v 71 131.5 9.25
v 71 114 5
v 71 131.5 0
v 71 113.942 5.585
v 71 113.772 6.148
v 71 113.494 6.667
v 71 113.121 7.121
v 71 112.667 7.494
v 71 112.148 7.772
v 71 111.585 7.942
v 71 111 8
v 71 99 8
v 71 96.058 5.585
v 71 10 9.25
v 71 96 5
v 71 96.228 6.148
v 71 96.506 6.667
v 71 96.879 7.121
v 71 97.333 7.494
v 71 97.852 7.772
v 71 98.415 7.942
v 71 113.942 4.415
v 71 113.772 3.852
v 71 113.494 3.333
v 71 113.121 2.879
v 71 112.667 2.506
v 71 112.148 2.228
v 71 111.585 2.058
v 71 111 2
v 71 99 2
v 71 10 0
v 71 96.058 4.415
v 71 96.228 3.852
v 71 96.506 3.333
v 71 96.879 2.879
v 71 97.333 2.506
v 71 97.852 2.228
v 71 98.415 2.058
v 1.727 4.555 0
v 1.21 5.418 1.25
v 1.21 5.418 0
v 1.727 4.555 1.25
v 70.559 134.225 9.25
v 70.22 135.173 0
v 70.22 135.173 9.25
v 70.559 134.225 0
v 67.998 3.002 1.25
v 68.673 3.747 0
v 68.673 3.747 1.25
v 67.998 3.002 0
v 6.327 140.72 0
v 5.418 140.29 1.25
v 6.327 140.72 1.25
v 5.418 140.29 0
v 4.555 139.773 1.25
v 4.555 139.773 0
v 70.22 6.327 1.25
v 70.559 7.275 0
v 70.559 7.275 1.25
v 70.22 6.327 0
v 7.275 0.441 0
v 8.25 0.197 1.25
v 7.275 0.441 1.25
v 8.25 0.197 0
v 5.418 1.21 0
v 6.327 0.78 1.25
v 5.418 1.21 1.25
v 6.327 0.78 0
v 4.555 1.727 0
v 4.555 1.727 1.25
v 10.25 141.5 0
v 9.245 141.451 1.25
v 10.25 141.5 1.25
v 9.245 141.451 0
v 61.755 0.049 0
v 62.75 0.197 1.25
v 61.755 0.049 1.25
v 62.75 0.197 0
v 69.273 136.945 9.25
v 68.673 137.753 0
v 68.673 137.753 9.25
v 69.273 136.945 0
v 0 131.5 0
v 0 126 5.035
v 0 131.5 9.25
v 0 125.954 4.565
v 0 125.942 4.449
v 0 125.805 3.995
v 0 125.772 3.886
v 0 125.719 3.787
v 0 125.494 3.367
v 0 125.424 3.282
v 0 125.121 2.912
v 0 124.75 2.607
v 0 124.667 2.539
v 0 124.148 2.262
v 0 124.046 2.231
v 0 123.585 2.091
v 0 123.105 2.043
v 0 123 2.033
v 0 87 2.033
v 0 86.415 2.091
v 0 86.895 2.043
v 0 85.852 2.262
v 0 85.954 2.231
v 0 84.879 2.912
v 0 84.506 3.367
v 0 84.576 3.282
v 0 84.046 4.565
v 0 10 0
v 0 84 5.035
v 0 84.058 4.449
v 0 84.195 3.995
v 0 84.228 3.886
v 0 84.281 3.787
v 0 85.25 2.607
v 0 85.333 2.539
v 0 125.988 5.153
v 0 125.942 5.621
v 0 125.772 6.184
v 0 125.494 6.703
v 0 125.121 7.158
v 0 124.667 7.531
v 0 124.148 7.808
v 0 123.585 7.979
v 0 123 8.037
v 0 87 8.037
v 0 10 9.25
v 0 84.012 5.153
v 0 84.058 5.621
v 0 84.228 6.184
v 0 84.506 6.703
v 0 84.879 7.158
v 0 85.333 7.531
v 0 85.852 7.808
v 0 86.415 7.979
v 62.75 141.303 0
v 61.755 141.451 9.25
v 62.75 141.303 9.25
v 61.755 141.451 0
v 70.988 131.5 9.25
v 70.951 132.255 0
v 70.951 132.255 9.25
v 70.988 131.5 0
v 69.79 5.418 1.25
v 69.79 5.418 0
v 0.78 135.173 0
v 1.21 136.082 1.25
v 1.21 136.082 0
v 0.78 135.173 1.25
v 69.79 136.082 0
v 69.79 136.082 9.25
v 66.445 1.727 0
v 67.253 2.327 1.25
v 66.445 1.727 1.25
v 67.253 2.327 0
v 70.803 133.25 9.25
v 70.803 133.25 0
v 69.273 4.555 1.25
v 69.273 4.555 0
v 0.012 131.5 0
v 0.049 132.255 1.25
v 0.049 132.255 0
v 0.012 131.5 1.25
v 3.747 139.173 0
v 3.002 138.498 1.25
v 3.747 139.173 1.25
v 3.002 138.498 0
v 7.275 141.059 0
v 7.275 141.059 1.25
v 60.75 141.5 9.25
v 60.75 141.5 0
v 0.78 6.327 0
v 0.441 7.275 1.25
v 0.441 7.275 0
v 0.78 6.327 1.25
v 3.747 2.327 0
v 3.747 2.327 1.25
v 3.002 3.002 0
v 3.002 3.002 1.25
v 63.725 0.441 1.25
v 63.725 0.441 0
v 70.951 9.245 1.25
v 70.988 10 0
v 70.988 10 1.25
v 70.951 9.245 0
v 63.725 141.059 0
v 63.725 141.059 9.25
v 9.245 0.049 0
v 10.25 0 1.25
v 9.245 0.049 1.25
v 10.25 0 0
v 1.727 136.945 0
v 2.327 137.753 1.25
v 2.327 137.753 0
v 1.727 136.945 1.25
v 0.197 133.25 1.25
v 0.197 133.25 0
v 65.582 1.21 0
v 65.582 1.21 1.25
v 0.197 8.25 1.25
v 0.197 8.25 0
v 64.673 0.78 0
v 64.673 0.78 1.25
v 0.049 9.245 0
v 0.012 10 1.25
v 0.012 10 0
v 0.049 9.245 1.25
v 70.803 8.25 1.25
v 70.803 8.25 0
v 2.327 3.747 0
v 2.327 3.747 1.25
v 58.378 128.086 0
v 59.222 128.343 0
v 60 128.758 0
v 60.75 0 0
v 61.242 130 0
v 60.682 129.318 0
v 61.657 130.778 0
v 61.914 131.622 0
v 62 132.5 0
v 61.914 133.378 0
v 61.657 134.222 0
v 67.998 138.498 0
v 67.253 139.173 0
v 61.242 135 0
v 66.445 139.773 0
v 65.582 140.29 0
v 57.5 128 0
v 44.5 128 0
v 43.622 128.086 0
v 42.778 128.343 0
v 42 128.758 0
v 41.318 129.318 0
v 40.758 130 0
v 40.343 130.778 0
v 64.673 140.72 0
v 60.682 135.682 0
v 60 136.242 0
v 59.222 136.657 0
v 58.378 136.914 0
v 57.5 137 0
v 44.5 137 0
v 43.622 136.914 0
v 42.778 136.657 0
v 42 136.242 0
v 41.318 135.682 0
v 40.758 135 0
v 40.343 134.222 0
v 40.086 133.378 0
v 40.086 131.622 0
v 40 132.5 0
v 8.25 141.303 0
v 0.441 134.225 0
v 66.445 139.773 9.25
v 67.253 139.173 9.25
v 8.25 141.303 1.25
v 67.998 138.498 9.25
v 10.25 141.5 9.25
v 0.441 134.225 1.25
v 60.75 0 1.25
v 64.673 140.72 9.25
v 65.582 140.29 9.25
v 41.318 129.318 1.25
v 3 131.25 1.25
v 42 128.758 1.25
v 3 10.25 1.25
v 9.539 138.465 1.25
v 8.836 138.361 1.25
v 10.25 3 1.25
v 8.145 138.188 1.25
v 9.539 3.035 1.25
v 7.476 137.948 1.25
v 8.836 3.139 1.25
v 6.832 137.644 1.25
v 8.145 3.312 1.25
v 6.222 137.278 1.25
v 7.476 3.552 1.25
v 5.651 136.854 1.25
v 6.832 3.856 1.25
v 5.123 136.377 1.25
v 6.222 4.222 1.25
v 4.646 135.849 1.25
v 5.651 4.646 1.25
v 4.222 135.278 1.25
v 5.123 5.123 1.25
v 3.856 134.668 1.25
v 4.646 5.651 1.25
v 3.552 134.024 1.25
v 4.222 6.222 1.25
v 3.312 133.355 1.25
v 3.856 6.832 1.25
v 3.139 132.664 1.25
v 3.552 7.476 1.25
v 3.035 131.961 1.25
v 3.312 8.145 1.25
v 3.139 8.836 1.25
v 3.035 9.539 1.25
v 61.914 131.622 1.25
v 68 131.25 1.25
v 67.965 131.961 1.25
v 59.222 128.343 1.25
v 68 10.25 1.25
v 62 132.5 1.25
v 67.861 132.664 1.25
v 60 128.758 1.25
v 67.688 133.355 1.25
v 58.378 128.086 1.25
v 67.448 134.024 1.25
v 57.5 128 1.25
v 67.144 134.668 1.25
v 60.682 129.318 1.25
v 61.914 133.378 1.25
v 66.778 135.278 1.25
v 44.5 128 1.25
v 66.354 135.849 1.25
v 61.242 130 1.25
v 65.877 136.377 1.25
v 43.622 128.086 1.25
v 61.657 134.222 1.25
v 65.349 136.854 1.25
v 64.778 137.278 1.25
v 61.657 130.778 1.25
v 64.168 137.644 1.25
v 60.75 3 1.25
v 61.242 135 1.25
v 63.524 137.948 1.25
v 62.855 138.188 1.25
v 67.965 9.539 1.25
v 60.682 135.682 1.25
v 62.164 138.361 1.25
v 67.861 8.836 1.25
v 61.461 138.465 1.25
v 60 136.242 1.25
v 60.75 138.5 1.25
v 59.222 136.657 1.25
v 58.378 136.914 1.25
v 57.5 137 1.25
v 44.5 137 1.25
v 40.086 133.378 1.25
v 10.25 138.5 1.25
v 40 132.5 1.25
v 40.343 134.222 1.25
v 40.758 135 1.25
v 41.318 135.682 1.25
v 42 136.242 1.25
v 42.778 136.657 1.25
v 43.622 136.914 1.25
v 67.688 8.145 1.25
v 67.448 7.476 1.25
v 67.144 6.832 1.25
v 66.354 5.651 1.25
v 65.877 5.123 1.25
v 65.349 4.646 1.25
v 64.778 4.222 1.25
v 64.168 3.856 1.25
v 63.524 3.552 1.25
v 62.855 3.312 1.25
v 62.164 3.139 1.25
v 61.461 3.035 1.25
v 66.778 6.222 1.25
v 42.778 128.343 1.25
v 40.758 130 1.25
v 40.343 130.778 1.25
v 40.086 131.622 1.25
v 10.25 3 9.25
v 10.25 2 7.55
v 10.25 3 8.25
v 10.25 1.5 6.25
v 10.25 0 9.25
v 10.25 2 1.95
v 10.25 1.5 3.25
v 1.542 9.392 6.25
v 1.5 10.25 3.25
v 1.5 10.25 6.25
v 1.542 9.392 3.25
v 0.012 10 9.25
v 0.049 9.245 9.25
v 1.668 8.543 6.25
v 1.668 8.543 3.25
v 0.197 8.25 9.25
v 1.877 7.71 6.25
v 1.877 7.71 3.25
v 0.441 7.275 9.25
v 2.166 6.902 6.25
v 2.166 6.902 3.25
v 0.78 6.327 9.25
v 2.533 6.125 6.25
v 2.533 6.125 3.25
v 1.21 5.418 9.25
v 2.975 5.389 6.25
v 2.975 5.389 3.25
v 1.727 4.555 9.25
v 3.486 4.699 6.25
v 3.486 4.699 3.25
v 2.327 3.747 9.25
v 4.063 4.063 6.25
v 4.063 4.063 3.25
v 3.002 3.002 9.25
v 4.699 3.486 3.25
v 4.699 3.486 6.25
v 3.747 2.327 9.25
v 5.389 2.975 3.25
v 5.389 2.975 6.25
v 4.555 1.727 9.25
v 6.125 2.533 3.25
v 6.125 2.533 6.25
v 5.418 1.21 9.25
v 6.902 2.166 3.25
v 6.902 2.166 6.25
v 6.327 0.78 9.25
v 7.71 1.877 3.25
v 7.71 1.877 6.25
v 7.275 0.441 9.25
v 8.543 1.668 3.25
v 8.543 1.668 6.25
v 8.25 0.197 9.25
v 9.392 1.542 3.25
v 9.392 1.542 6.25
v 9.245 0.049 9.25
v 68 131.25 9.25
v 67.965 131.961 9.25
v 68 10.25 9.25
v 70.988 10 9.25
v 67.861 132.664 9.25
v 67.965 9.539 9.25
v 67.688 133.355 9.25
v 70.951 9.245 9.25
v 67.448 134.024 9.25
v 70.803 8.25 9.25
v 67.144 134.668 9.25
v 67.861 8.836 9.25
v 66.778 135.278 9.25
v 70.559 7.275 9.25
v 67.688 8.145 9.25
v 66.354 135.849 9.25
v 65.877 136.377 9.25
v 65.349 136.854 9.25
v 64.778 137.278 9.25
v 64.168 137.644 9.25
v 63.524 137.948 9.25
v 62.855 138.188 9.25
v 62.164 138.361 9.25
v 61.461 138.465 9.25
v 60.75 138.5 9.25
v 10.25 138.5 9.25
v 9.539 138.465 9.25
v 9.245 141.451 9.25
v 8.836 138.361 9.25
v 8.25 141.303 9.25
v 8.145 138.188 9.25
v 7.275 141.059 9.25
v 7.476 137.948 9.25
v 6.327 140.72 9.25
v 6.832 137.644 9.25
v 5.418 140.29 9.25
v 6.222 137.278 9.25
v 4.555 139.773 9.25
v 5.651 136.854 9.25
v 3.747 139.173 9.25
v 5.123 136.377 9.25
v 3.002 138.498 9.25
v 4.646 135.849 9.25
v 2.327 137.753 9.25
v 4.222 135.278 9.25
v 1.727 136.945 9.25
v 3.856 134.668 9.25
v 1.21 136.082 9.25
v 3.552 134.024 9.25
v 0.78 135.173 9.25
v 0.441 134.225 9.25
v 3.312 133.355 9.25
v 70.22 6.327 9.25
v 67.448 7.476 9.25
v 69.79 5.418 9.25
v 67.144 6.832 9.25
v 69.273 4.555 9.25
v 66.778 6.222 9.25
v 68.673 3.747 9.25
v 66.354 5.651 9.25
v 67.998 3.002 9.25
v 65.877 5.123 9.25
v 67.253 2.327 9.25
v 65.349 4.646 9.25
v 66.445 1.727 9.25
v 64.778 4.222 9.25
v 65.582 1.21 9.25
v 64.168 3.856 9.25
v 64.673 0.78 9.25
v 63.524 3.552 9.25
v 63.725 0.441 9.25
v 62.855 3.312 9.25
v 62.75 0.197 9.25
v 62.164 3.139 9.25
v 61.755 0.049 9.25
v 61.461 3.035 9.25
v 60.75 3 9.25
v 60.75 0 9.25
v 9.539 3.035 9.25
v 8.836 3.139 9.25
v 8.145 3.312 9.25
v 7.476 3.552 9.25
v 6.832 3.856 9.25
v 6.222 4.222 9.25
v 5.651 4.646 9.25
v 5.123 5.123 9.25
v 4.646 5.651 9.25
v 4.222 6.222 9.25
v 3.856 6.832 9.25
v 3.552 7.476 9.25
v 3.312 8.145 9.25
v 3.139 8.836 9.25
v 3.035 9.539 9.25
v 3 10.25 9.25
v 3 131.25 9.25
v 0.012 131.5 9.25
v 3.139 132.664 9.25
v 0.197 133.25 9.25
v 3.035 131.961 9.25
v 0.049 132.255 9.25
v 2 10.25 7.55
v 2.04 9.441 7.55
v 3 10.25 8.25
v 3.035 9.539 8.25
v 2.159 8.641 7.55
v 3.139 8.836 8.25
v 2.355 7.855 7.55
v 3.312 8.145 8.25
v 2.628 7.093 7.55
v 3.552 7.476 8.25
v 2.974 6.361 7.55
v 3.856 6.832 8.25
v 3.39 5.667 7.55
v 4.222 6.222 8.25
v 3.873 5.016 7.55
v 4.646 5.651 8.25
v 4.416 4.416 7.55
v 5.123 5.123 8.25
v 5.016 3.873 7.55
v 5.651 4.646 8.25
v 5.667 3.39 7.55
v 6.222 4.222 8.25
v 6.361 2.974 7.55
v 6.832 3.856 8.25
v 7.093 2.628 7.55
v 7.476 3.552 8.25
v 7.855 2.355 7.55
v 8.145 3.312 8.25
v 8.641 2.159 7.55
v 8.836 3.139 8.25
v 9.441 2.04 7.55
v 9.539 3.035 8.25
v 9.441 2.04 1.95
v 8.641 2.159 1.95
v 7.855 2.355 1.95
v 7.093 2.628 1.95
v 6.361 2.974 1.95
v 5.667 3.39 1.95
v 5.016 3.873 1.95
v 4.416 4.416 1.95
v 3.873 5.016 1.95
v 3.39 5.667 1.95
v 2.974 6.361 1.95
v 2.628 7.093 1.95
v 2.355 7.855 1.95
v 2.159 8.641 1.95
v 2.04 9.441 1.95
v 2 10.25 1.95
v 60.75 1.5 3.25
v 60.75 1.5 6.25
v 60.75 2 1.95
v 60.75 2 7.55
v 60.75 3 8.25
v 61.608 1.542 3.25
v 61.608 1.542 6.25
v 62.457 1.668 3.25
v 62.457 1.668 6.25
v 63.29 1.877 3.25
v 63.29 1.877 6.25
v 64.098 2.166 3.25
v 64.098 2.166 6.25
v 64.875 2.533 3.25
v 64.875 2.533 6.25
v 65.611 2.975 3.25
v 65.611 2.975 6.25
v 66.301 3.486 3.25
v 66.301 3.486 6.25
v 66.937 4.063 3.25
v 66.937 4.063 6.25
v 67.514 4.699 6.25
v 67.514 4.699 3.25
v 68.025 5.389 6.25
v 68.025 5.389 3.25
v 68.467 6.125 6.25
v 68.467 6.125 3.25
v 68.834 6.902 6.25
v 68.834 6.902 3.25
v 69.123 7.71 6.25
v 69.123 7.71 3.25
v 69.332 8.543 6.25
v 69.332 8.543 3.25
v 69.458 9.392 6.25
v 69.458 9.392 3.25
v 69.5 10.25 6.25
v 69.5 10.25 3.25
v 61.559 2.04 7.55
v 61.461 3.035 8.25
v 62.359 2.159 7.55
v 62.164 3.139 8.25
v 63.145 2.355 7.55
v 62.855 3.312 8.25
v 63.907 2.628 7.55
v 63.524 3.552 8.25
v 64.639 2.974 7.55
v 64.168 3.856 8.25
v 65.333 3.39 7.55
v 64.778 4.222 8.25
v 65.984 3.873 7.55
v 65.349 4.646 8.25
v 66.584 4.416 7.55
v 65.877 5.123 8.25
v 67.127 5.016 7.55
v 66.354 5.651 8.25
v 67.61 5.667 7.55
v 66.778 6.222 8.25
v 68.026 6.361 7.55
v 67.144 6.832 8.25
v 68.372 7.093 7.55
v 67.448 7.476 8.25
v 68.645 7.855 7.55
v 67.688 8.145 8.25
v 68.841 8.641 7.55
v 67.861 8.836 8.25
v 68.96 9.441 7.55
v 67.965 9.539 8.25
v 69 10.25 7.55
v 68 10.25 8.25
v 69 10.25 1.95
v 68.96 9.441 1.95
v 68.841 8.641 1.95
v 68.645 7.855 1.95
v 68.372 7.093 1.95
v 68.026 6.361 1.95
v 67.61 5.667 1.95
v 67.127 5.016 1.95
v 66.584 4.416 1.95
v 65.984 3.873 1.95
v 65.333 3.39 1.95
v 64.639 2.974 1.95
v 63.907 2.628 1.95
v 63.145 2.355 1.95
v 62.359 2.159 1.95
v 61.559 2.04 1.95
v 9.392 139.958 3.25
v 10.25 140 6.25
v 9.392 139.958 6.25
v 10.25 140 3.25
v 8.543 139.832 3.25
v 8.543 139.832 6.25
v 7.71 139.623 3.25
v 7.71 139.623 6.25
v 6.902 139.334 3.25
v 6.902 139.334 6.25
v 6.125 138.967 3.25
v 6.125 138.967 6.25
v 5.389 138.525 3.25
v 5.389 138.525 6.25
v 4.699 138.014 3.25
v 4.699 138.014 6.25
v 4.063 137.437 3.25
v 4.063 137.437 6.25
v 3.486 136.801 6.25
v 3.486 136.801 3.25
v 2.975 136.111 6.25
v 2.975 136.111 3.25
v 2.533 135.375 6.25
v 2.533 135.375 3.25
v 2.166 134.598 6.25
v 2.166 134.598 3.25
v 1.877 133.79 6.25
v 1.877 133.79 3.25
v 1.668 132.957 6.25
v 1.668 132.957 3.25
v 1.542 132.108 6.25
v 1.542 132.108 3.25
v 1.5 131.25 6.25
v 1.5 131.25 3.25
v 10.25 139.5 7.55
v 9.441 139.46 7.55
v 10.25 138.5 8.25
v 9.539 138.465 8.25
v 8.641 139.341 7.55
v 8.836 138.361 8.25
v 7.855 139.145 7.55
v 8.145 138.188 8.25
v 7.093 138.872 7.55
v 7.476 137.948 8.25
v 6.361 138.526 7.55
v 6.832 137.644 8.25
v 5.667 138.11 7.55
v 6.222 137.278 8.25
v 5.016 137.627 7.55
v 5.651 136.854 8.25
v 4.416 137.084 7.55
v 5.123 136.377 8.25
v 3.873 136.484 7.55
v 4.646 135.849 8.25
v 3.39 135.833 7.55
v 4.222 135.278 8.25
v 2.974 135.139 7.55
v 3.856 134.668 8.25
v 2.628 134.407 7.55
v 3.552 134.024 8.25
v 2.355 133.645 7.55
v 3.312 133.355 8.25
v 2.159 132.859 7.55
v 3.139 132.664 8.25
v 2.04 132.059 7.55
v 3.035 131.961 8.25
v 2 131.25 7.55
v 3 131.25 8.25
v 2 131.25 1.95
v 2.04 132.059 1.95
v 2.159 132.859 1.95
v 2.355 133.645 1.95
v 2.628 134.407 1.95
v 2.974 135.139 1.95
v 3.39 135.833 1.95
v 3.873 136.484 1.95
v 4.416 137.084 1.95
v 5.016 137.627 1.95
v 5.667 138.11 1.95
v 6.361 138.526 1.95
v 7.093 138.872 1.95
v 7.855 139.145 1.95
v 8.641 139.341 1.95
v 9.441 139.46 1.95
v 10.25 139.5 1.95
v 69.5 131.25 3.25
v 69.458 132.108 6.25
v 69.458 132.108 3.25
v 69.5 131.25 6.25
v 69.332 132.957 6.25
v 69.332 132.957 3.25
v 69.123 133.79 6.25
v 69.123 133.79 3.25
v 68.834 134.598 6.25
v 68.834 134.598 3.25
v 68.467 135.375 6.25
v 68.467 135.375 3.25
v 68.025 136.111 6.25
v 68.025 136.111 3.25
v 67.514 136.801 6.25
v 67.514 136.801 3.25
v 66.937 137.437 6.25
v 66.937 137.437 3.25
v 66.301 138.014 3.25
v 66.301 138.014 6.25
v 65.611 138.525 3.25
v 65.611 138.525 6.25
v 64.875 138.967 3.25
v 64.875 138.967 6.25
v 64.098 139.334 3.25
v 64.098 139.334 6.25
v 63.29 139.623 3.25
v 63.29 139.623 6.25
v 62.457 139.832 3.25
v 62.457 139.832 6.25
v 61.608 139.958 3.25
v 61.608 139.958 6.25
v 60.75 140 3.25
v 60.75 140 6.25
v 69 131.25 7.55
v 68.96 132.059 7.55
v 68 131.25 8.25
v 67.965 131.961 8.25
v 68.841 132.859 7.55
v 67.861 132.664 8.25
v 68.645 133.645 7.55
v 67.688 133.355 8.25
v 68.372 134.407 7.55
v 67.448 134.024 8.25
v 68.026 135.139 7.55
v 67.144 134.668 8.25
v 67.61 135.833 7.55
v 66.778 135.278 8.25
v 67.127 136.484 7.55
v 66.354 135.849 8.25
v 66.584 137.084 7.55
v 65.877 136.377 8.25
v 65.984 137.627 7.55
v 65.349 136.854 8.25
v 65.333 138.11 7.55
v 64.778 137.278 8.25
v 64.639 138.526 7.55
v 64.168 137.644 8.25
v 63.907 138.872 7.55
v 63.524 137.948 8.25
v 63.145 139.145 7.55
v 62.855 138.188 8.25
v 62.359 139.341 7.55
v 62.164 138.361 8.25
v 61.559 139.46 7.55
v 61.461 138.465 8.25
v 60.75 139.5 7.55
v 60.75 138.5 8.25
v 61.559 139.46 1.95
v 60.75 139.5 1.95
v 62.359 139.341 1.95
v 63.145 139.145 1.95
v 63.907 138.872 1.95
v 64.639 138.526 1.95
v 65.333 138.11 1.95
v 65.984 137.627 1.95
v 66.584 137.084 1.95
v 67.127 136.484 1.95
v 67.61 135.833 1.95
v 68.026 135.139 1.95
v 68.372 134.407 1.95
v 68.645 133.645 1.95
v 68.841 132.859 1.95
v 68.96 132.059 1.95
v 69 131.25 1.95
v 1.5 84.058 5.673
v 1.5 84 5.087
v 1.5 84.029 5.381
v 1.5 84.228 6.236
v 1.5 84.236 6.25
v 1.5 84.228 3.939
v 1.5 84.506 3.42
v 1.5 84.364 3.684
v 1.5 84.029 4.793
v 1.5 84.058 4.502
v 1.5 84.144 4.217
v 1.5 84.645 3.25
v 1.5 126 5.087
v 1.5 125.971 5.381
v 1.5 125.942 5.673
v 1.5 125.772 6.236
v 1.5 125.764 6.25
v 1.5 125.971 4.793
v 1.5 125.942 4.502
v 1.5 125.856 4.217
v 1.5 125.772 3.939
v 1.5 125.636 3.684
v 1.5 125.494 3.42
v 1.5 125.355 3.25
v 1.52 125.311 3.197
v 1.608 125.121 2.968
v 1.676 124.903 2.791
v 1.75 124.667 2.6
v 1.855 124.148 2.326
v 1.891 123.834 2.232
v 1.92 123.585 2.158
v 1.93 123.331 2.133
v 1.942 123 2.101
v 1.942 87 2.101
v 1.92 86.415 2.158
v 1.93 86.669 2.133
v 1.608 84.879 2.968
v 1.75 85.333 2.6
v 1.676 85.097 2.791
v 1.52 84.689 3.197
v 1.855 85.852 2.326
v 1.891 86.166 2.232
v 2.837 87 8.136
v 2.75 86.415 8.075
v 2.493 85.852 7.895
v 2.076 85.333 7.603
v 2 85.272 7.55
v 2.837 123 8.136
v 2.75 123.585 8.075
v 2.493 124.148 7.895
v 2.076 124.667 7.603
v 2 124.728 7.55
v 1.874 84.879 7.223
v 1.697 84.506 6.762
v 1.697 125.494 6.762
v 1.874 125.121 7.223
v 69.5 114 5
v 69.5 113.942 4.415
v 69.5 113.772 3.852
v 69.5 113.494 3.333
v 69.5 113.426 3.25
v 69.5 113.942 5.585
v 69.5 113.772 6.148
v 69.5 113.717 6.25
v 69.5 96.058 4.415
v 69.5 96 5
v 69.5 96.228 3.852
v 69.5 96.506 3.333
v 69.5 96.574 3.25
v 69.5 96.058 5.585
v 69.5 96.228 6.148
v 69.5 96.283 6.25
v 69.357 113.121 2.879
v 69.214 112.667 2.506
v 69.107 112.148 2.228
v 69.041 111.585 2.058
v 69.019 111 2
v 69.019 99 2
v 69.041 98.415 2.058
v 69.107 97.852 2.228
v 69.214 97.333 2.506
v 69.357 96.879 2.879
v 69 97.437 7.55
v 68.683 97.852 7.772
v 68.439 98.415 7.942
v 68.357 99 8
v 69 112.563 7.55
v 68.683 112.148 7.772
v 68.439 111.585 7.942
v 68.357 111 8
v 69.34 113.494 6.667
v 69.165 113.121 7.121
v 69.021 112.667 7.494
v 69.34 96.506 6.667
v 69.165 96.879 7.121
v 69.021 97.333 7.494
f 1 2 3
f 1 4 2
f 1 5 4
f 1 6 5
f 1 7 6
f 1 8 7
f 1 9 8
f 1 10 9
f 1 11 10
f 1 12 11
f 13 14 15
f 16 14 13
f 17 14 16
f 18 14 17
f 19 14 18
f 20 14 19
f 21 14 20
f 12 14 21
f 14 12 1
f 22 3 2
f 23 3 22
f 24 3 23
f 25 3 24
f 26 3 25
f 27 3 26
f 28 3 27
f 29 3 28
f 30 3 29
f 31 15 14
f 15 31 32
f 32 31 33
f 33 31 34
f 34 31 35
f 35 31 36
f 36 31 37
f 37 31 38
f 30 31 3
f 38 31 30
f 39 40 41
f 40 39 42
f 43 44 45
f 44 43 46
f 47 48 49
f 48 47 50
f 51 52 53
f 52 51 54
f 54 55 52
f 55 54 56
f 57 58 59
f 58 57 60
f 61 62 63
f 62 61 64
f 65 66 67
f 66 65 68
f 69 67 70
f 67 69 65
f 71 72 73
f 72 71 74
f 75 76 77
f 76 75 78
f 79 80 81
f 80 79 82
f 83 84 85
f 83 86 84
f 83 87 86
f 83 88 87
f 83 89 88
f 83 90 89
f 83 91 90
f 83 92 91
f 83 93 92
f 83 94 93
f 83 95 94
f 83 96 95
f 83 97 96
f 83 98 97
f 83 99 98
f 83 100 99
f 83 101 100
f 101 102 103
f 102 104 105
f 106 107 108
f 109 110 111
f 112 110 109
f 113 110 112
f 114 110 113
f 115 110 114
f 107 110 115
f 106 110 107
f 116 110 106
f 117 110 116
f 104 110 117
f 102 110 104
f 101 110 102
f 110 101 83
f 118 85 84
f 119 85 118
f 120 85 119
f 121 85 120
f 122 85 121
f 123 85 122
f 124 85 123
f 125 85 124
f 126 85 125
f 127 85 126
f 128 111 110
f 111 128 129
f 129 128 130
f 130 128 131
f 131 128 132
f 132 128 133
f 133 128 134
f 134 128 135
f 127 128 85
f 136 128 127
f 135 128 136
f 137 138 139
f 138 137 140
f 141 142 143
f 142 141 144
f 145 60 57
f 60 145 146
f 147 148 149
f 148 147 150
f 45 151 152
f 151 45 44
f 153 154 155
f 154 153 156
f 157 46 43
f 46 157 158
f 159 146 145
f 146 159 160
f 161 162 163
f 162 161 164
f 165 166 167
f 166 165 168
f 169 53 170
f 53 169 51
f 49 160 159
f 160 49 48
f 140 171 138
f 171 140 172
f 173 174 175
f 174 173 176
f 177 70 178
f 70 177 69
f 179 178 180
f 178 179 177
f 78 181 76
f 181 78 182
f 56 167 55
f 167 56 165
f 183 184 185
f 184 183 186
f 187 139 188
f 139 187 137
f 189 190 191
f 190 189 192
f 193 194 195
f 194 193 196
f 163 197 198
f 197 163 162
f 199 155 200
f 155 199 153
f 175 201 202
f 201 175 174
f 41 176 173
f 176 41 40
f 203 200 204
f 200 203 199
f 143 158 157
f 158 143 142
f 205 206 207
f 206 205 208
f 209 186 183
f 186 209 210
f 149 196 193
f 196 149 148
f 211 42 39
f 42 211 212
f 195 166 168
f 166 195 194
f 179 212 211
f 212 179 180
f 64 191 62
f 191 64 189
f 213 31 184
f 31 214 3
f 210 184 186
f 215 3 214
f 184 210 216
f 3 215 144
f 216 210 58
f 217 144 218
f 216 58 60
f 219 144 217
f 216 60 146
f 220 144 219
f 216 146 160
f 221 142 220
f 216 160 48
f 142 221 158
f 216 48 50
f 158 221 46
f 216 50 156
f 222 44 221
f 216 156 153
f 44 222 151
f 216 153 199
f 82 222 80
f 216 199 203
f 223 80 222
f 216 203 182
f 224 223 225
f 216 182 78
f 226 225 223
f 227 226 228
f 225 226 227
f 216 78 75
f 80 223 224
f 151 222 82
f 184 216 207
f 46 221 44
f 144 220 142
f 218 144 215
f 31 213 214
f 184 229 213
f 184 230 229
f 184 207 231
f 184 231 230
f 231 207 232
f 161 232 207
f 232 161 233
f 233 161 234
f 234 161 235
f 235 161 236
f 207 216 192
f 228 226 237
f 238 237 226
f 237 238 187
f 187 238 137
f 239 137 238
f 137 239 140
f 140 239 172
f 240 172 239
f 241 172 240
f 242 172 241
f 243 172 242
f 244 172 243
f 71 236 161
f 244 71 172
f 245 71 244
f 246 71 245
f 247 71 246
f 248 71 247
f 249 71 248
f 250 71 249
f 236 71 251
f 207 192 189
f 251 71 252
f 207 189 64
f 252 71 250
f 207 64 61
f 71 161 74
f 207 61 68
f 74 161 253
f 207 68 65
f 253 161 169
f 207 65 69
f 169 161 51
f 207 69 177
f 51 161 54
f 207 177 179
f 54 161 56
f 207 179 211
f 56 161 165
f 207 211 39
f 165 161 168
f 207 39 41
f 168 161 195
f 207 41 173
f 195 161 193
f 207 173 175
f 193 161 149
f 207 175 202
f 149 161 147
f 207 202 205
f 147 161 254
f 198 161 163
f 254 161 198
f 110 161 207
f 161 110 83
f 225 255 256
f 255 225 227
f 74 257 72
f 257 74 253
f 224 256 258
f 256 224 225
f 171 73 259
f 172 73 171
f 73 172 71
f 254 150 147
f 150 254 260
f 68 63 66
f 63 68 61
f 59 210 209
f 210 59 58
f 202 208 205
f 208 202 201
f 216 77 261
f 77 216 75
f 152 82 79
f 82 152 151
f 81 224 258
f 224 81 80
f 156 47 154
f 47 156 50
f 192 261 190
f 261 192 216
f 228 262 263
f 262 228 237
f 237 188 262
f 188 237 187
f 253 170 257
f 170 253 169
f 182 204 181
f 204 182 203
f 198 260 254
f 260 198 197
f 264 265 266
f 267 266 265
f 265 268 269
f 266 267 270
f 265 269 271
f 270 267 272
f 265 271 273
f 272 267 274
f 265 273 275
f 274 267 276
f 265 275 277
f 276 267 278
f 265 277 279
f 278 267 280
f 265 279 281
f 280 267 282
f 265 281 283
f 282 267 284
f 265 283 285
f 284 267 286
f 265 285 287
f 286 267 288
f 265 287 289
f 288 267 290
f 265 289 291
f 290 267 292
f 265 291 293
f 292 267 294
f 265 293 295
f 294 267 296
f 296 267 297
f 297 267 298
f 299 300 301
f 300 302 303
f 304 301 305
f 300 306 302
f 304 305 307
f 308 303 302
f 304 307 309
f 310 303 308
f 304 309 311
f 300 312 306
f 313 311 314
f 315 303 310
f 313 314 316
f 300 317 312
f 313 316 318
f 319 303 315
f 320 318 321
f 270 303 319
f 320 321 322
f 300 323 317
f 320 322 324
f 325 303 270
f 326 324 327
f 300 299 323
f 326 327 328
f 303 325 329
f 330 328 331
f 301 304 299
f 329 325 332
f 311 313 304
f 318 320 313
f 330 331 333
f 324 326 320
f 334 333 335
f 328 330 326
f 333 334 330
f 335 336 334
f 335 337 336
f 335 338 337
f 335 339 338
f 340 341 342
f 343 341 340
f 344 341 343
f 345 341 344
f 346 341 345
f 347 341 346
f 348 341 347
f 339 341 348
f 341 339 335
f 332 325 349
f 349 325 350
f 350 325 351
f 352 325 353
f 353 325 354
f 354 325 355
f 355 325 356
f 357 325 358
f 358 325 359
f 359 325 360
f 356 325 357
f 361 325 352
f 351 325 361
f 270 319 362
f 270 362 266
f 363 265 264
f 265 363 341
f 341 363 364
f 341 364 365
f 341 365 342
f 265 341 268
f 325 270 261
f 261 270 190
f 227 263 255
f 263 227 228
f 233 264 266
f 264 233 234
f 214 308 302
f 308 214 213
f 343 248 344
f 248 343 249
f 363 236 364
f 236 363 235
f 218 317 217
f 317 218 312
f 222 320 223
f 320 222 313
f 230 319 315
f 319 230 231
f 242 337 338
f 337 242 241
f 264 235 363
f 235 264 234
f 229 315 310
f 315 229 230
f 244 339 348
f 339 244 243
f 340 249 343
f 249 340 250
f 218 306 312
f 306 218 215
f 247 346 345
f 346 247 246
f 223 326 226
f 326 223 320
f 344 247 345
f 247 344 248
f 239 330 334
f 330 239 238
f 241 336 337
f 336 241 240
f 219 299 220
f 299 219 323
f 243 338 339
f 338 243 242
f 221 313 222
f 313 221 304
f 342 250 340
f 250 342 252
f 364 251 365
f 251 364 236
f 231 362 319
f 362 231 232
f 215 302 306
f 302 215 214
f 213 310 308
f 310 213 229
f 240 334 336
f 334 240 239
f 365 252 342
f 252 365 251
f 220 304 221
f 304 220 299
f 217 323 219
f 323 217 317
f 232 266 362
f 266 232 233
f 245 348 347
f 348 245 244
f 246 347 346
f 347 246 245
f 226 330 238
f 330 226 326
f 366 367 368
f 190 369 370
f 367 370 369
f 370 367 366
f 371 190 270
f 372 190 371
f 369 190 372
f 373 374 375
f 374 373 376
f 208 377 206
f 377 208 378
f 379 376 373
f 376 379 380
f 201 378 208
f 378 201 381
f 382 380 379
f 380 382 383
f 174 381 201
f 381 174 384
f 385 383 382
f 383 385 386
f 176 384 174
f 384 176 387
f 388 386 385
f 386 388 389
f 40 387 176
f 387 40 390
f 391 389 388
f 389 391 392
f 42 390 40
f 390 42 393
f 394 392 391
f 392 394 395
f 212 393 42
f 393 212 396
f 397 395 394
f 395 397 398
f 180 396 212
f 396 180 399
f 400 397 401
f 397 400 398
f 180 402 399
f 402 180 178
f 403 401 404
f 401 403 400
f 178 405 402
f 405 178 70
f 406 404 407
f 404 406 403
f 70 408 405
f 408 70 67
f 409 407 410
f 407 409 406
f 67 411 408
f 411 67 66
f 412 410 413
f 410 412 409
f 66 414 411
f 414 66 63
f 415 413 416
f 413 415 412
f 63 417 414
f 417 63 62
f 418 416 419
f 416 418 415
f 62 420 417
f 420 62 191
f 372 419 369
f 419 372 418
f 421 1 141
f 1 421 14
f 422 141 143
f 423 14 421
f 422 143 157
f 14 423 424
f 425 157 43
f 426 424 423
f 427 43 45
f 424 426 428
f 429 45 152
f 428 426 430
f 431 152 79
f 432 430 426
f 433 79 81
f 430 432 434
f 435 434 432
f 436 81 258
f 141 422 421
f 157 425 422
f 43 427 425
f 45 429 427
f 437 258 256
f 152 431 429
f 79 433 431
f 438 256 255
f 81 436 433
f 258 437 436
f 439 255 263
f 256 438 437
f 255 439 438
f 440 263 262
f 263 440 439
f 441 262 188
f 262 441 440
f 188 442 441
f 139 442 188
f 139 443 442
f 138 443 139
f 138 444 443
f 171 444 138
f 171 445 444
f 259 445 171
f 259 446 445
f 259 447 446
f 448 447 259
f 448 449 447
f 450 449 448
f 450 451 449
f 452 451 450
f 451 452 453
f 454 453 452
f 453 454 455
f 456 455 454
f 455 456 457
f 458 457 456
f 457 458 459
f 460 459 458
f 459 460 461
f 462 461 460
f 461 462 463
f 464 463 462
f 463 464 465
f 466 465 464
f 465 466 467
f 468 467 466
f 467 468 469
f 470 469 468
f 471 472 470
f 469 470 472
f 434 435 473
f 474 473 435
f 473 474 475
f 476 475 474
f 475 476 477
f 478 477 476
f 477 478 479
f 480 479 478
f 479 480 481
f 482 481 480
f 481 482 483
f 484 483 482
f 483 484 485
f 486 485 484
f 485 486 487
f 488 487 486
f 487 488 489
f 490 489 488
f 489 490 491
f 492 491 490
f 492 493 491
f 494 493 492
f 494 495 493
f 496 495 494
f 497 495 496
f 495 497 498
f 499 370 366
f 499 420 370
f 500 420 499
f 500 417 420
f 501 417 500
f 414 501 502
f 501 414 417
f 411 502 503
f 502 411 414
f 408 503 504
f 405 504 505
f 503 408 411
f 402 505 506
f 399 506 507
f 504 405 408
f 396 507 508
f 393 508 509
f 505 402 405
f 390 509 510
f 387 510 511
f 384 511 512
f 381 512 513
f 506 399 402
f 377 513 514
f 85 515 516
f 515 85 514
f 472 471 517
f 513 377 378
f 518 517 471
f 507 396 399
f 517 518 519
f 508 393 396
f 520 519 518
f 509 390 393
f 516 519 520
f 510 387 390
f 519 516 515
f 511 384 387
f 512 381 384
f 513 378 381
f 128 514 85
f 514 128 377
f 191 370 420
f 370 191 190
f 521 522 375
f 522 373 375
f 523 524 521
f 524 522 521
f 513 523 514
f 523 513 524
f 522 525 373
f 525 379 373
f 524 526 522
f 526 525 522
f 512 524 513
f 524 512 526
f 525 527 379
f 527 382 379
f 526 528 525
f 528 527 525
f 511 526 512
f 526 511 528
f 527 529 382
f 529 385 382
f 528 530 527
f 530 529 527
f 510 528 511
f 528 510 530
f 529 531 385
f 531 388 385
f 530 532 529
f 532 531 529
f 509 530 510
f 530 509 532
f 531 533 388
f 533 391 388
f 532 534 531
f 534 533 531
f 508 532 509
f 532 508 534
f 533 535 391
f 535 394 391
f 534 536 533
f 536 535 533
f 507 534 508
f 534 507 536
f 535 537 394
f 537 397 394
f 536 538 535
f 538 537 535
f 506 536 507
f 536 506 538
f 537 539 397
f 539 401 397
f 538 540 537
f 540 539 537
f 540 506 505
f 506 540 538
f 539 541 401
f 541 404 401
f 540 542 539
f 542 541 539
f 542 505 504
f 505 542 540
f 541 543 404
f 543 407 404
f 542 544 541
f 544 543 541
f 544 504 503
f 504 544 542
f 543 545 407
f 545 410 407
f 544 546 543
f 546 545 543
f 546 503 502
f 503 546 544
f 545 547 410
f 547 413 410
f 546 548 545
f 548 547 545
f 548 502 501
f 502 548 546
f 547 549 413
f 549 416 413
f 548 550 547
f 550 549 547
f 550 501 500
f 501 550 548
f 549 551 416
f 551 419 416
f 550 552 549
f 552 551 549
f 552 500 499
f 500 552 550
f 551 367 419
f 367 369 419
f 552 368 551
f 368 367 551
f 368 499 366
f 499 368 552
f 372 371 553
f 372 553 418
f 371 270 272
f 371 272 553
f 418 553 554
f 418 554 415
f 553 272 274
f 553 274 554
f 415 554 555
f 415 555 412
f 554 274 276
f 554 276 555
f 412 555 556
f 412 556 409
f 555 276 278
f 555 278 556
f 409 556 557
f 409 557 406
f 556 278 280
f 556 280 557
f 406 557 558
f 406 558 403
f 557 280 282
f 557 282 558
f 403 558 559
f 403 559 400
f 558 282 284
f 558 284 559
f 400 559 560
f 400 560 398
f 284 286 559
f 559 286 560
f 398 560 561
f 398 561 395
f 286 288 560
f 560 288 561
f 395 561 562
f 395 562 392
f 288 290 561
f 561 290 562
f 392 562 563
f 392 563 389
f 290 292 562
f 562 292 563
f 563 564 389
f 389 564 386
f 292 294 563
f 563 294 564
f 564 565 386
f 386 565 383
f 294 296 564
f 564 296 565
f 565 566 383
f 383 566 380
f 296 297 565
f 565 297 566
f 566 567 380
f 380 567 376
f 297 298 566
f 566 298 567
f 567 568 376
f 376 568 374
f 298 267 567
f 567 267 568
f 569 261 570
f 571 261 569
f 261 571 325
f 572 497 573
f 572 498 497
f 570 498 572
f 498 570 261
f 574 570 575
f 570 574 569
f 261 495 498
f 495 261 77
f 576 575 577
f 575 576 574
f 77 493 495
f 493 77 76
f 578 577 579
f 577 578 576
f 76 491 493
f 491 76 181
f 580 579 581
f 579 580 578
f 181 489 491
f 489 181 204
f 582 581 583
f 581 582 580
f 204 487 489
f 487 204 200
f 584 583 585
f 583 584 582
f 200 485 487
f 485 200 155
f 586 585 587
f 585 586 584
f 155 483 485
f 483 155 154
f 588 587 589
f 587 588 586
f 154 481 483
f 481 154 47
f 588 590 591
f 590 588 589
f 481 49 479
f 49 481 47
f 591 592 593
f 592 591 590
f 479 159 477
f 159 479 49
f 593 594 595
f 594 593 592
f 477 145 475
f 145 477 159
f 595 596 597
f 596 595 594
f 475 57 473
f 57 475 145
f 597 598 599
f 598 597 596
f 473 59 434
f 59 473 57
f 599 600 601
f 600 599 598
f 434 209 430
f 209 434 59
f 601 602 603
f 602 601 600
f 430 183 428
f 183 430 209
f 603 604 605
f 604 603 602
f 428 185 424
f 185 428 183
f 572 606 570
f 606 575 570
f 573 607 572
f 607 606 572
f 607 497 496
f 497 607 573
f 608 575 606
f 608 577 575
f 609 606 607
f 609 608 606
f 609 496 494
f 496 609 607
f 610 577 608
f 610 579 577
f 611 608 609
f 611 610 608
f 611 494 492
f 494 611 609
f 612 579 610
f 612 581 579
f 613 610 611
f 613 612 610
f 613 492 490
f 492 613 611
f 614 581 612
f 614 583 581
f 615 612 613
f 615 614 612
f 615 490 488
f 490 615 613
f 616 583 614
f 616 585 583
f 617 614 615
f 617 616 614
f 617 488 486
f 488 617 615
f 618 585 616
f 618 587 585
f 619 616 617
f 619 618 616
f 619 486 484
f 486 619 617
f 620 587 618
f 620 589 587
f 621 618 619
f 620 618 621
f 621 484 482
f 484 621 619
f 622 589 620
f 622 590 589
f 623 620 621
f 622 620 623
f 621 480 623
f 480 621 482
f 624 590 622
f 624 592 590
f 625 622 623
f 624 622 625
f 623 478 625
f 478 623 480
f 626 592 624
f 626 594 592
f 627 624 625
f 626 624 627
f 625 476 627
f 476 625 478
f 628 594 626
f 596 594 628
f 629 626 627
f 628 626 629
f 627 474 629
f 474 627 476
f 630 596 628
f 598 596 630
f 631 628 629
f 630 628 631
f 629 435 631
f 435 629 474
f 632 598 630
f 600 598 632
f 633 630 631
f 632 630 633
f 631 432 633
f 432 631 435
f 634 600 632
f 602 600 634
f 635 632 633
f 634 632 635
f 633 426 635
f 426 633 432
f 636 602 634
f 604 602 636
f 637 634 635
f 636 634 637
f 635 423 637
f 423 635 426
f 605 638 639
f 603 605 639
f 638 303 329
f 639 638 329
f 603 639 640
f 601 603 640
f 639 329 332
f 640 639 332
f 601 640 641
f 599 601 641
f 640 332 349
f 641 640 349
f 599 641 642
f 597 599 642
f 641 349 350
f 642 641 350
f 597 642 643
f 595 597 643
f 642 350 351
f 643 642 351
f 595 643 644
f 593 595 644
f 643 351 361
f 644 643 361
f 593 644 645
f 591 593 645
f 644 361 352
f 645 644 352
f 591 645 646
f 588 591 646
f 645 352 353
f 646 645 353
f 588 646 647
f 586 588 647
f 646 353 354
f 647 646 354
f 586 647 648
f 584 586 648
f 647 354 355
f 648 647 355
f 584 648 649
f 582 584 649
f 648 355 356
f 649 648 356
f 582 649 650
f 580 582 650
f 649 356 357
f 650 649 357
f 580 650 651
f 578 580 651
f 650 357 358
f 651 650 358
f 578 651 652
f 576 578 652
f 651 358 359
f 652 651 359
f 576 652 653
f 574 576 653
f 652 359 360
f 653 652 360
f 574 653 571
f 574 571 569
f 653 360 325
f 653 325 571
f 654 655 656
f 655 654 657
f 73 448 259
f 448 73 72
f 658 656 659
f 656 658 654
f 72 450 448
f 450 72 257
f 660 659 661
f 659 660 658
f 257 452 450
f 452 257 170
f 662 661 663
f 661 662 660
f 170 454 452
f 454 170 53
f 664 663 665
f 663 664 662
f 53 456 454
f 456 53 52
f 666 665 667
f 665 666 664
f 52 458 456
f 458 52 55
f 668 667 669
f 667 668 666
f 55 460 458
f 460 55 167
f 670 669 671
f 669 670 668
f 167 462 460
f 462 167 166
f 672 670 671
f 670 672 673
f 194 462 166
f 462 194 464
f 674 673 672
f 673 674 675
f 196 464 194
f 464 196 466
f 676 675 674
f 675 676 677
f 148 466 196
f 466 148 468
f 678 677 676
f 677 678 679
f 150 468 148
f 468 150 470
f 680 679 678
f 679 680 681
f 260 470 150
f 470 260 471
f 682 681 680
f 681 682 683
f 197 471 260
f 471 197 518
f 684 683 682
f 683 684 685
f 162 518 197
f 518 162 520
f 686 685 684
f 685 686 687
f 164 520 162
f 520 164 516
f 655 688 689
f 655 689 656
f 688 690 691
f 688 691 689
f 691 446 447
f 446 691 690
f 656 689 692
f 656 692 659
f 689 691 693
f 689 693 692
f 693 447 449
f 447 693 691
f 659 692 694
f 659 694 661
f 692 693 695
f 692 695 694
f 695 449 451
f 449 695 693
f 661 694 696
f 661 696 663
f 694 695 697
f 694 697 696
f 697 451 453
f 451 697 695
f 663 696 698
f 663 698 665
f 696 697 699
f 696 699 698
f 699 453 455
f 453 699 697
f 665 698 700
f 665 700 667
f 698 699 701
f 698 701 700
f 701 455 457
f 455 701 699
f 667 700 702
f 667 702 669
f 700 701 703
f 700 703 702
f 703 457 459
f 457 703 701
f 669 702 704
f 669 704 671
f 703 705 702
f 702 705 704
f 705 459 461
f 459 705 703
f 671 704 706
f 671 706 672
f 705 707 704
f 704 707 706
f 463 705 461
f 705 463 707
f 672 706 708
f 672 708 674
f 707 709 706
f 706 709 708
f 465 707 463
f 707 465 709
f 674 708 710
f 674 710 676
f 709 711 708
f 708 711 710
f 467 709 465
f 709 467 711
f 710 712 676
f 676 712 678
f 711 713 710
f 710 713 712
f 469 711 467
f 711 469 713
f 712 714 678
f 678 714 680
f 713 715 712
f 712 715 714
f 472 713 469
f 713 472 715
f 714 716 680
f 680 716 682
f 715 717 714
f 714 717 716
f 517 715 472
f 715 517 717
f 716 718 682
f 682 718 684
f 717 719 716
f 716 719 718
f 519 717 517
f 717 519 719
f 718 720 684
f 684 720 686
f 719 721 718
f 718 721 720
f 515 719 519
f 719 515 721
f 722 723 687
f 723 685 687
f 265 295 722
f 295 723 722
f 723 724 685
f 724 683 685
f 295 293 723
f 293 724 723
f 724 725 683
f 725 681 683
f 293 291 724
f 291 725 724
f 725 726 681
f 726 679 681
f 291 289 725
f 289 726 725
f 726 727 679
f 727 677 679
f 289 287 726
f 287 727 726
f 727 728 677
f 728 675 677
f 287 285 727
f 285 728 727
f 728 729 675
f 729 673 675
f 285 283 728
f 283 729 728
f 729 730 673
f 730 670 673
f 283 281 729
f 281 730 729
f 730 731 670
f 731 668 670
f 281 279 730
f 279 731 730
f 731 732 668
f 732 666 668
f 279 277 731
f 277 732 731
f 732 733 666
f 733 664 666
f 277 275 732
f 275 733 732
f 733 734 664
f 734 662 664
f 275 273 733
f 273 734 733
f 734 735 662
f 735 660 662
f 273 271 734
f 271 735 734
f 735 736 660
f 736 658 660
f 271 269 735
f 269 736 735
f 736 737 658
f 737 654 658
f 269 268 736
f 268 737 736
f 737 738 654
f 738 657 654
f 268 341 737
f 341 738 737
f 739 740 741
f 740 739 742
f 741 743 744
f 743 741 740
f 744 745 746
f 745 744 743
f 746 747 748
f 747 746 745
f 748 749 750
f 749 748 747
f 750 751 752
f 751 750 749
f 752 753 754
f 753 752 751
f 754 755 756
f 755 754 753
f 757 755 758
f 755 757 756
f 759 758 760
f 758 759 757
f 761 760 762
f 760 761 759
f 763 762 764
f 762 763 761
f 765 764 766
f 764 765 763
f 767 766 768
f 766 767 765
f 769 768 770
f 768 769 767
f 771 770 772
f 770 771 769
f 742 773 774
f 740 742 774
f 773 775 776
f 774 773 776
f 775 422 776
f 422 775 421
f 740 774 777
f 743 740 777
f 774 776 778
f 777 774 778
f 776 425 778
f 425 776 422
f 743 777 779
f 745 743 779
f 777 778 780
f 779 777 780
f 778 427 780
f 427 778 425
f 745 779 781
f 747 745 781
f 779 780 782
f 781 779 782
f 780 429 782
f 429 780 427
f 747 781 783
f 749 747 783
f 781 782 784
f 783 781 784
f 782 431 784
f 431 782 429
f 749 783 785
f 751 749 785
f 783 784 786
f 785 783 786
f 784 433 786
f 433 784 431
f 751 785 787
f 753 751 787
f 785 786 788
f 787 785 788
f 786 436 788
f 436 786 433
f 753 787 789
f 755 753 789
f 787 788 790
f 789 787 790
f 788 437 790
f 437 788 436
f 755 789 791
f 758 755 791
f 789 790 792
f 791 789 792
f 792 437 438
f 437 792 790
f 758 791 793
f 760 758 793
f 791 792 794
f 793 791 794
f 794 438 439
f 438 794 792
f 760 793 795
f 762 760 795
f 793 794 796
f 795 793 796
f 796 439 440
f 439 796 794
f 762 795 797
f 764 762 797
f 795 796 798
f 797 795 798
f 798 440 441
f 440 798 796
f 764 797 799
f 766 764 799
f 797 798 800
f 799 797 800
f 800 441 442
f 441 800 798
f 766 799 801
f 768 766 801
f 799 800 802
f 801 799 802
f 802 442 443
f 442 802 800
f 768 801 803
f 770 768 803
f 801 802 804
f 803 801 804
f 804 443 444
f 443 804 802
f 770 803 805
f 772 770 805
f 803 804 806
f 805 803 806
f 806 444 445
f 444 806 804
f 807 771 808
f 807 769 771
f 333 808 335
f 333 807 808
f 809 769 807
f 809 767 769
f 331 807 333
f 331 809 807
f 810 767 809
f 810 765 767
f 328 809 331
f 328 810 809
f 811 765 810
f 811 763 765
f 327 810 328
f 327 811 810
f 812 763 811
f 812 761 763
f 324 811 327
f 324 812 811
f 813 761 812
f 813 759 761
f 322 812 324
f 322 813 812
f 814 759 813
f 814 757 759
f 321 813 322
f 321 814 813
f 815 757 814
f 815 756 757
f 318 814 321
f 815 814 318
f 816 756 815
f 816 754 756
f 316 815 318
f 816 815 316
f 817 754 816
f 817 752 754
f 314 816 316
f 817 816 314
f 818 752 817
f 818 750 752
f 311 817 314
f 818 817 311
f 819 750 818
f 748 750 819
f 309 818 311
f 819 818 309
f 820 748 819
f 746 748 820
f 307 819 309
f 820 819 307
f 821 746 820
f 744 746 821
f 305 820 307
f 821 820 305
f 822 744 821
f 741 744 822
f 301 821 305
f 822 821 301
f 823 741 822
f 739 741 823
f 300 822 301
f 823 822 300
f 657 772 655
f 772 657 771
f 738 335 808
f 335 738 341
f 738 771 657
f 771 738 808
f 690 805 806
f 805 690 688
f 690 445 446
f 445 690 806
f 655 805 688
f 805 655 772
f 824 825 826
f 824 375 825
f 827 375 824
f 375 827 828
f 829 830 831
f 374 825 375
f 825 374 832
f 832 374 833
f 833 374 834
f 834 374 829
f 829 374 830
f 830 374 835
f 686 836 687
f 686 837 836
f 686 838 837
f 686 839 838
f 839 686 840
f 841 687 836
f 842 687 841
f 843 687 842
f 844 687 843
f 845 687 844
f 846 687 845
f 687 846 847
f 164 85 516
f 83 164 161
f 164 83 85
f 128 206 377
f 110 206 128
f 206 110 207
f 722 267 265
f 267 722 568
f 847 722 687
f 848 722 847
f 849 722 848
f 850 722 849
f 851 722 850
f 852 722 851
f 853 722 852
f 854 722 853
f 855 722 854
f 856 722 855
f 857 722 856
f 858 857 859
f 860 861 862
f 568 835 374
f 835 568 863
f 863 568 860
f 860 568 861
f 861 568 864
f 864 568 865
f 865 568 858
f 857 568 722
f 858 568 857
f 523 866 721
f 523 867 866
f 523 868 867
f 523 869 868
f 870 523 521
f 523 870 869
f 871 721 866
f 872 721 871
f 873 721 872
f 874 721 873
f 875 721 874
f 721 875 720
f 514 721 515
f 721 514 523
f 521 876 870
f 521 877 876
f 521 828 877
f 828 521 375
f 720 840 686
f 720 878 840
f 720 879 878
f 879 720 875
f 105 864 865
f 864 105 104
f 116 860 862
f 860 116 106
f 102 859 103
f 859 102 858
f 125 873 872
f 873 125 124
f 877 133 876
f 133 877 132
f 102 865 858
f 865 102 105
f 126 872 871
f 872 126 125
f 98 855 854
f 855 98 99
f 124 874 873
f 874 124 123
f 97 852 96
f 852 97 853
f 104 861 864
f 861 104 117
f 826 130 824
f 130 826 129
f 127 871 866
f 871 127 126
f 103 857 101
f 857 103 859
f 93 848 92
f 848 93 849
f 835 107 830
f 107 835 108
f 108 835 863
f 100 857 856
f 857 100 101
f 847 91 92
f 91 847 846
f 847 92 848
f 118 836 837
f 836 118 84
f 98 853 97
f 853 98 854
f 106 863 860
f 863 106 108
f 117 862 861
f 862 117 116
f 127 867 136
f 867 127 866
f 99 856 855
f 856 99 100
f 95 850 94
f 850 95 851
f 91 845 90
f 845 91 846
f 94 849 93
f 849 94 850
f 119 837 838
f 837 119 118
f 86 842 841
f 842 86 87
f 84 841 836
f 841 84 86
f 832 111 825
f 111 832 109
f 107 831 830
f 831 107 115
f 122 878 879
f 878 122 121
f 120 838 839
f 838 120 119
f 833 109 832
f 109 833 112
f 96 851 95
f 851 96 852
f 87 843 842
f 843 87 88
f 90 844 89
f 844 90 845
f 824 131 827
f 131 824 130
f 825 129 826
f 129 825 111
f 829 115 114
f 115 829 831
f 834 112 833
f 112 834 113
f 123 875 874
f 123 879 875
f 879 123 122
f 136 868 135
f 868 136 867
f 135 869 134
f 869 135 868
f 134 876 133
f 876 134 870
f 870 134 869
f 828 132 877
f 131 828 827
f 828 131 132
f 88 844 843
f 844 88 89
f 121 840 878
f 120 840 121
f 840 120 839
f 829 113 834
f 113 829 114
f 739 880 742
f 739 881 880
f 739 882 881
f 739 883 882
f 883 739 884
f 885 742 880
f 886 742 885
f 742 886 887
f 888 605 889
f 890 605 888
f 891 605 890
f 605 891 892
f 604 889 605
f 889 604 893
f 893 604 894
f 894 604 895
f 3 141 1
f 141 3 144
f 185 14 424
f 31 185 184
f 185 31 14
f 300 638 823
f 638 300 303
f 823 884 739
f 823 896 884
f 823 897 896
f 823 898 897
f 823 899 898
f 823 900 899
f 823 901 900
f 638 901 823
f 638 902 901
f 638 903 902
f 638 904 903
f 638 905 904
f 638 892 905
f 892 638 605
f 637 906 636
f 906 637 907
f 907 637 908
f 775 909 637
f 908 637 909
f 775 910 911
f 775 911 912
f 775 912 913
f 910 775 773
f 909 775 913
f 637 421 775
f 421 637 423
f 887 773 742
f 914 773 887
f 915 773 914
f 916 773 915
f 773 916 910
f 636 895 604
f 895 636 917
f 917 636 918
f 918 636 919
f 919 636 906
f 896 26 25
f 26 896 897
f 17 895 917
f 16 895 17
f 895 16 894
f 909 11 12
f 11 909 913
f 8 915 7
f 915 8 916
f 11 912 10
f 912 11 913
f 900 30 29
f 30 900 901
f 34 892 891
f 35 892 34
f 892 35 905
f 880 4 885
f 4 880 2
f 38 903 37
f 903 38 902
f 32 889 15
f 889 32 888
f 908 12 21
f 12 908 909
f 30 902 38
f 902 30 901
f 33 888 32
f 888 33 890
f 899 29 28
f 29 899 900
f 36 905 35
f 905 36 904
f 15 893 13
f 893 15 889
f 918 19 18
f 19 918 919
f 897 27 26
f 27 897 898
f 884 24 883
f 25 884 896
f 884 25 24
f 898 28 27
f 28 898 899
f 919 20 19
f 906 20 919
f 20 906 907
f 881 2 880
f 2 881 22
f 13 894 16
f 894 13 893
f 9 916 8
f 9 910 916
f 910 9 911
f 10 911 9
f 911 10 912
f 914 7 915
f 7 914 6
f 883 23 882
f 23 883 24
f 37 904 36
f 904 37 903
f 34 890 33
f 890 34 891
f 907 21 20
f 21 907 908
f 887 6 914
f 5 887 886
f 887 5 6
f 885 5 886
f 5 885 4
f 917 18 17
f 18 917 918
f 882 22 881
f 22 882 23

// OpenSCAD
W=71; // overall width
L=141.5; // overall length
R=10.25; // corner radius
WT=1.5; // wall thickness
WH=9.25; // wall height
BT=1.25; // backplate thickness


module roundCorner(angle=90, 
        wallThickness=1.5, 
        wallHeight=10, 
        radius=10.5)
{
    rotate_extrude(convexity=10, angle=angle, $fn=64)
    translate([radius, 0, 0])
        polygon(points=[[0, 0], 
            [wallThickness, 0], 
            [wallThickness, wallHeight], 
            [0, wallHeight]]);
}

module backPlate(radius, 
        height, 
        width, 
        length)
{
    hull(){
        translate([radius, radius, 0])
            cylinder(r=radius, h=height, $fn=64);

        translate([width-radius, radius, 0])
            cylinder(r=radius, h=height, $fn=64);
            
        translate([radius, length-radius, 0])
            cylinder(r=radius, h=height, $fn=64);

        translate([width-radius, length-radius, 0])
            cylinder(r=radius, h=height, $fn=64);
    }
}

module backPlateCutout(){
    hull(){
        translate([44.5, 132.5, -1])
            cylinder(r=4.5, h=3, $fn=32);
        translate([57.5, 132.5, -1])
            cylinder(r=4.5, h=3, $fn=32);
    }
}

module leftWallCutout(){
    translate([-1, 87, 5])
    hull(){
        rotate([0, 88, 0]){
            cylinder(r=3, h=5, $fn=32);
            translate([0, 36, 0])
                cylinder(r=3, h=5, $fn=32);
        }
    }
}

module rightWallCutout(){
    translate([W-WT-2, 99, 5])
    hull(){
        rotate([0, 90, 0]){
            cylinder(r=3, h=5, $fn=32);
            translate([0, 12, 0])
                cylinder(r=3, h=5, $fn=32);
        }
    }
}


module flange(length){
    color("green")
    linear_extrude(height=length, 
        center=false,
        convexity=10, 
        twist=0)
        polygon(points=[[0,0], 
            [0,3], 
            [1.5,3],
            [1.5,2],
            [.5,1.3],
            [0,0]]); 
}

module cornerFlange(angle=90, 
        radius)
{
    color("red")
    rotate_extrude(convexity=10, angle=angle, $fn=64)
    translate([radius, 0, 0])
        polygon(points=[[1, 1.3], 
        [0,2], 
        [0,3], 
        [1.5,3],
        [1.5,0]]);
}




difference(){
    backPlate(width=W, length=L, radius=R, height=BT);
    backPlateCutout();
}

//corners
translate([R, R, 0]){
    rotate([0, 0, 180]){
        roundCorner(radius=R-WT, wallHeight=WH);
        translate([0, 0, WH-3])
            cornerFlange(radius=R-WT-1.5);
        translate([0, 0, 3.25])
        rotate([0, 180, -90])
            cornerFlange(radius=R-WT-1.5);
    }
}

translate([W-R, R, 0]){
    rotate([0, 0, 270]){
        roundCorner(radius=R-WT, wallHeight=WH);
        translate([0, 0, WH-3])
            cornerFlange(radius=R-WT-1.5);
        translate([0, 0, 3.25])
        rotate([0, 180, -90])
            cornerFlange(radius=R-WT-1.5);
    }
}

translate([R, L-R, 0]){
    rotate([0, 0, 90]){
        roundCorner(radius=R-WT, wallHeight=WH);
        translate([0, 0, WH-3])
            cornerFlange(radius=R-WT-1.5);
        translate([0, 0, 3.25])
        rotate([0, 180, -90])
            cornerFlange(radius=R-WT-1.5);        
    }
}

translate([W-R, L-R, 0]){
    roundCorner(radius=R-WT, wallHeight=WH);
    translate([0, 0, WH-3])
            cornerFlange(radius=R-WT-1.5);
    translate([0, 0, 3.25])
    rotate([0, 180, -90])
        cornerFlange(radius=R-WT-1.5);
}

// side walls
union(){
    translate([R, L-WT, 0])
        cube([W-(2*R), WT, WH]); 
    
    translate([R-.25, L-WT, 3.25])
    rotate([-90, 0, 270])
        flange(length=W-(R*2)+.5);
    
    translate([W-R+.25, L-WT, WH-3])
    rotate([90, 0, 270])
        flange(length=W-(R*2)+.5);
}

difference(){
    union(){
        translate([0, R-.25, 0])
            cube([WT, L-(2*R)+.5, WH]);
        
        translate([WT, R-.25, 3.25])
        rotate([-90, 0, 0])
            flange(length=L-(R*2)+.5);
        
        translate([WT, L-R+.25, WH-3])
        rotate([90, 0, 0])
            flange(length=L-(R*2)+.5);
    }
    leftWallCutout();
}

difference(){
    union(){
        translate([W-WT, R-.25, 0])
            cube([WT, L-(2*R)+.5, WH]);
        
        translate([W-WT, L-R+.25, 3.25])
        rotate([-90, 0, 180])
            flange(length=L-(R*2)+.5);
        
        translate([W-WT, R-.25, WH-3])
        rotate([90, 0, 180])
            flange(length=L-(R*2)+.5);
    }
    rightWallCutout();
}
